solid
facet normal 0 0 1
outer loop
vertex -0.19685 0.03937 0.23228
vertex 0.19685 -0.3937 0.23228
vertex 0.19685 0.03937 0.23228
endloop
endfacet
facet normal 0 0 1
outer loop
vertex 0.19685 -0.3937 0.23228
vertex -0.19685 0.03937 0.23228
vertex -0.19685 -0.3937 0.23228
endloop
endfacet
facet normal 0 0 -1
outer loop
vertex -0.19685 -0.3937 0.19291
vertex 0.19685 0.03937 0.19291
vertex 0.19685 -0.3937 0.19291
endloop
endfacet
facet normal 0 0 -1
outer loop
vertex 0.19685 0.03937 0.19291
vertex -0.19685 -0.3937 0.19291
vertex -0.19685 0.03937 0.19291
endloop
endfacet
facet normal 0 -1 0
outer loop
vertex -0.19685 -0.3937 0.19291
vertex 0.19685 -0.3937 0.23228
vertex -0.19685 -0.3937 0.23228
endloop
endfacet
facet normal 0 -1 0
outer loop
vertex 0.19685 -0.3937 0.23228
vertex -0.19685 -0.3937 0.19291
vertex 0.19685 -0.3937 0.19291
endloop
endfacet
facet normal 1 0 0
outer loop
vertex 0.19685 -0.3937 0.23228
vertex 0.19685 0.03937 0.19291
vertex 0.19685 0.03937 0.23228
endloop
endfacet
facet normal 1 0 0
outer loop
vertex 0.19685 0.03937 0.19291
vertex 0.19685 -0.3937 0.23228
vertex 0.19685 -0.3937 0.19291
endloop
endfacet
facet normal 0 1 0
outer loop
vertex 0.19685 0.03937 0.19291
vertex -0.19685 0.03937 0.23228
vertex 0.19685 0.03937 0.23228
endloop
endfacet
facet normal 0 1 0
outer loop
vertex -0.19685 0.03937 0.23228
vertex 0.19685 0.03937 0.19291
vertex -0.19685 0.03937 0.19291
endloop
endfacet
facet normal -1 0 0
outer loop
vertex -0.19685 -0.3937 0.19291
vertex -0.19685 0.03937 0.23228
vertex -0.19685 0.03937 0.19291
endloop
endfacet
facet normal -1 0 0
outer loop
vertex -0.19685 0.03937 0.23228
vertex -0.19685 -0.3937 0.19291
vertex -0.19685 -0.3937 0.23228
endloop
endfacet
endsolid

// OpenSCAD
// file: defines.scad
L = 3.1;  // Длина
W = 3.1;  // Ширина
H = 0.8;  // Высота (от платы, с выводами)
Hf = 0.04;  // Возвышение над платой (высота выводов)
e = 0.5;    // Шаг выводов

pin_fragments = 16;

scale = 1/2.54;
// main file
include <defines.scad>

scale(scale)
  color([1.0, 0.6, 0.0])
    translate([0, 0, (H - Hf)/2]) {
      translate([0,-0.45, (H - Hf)/2 - 0.22]) cube([1.0, 1.1, 0.1], center = true);
    }
